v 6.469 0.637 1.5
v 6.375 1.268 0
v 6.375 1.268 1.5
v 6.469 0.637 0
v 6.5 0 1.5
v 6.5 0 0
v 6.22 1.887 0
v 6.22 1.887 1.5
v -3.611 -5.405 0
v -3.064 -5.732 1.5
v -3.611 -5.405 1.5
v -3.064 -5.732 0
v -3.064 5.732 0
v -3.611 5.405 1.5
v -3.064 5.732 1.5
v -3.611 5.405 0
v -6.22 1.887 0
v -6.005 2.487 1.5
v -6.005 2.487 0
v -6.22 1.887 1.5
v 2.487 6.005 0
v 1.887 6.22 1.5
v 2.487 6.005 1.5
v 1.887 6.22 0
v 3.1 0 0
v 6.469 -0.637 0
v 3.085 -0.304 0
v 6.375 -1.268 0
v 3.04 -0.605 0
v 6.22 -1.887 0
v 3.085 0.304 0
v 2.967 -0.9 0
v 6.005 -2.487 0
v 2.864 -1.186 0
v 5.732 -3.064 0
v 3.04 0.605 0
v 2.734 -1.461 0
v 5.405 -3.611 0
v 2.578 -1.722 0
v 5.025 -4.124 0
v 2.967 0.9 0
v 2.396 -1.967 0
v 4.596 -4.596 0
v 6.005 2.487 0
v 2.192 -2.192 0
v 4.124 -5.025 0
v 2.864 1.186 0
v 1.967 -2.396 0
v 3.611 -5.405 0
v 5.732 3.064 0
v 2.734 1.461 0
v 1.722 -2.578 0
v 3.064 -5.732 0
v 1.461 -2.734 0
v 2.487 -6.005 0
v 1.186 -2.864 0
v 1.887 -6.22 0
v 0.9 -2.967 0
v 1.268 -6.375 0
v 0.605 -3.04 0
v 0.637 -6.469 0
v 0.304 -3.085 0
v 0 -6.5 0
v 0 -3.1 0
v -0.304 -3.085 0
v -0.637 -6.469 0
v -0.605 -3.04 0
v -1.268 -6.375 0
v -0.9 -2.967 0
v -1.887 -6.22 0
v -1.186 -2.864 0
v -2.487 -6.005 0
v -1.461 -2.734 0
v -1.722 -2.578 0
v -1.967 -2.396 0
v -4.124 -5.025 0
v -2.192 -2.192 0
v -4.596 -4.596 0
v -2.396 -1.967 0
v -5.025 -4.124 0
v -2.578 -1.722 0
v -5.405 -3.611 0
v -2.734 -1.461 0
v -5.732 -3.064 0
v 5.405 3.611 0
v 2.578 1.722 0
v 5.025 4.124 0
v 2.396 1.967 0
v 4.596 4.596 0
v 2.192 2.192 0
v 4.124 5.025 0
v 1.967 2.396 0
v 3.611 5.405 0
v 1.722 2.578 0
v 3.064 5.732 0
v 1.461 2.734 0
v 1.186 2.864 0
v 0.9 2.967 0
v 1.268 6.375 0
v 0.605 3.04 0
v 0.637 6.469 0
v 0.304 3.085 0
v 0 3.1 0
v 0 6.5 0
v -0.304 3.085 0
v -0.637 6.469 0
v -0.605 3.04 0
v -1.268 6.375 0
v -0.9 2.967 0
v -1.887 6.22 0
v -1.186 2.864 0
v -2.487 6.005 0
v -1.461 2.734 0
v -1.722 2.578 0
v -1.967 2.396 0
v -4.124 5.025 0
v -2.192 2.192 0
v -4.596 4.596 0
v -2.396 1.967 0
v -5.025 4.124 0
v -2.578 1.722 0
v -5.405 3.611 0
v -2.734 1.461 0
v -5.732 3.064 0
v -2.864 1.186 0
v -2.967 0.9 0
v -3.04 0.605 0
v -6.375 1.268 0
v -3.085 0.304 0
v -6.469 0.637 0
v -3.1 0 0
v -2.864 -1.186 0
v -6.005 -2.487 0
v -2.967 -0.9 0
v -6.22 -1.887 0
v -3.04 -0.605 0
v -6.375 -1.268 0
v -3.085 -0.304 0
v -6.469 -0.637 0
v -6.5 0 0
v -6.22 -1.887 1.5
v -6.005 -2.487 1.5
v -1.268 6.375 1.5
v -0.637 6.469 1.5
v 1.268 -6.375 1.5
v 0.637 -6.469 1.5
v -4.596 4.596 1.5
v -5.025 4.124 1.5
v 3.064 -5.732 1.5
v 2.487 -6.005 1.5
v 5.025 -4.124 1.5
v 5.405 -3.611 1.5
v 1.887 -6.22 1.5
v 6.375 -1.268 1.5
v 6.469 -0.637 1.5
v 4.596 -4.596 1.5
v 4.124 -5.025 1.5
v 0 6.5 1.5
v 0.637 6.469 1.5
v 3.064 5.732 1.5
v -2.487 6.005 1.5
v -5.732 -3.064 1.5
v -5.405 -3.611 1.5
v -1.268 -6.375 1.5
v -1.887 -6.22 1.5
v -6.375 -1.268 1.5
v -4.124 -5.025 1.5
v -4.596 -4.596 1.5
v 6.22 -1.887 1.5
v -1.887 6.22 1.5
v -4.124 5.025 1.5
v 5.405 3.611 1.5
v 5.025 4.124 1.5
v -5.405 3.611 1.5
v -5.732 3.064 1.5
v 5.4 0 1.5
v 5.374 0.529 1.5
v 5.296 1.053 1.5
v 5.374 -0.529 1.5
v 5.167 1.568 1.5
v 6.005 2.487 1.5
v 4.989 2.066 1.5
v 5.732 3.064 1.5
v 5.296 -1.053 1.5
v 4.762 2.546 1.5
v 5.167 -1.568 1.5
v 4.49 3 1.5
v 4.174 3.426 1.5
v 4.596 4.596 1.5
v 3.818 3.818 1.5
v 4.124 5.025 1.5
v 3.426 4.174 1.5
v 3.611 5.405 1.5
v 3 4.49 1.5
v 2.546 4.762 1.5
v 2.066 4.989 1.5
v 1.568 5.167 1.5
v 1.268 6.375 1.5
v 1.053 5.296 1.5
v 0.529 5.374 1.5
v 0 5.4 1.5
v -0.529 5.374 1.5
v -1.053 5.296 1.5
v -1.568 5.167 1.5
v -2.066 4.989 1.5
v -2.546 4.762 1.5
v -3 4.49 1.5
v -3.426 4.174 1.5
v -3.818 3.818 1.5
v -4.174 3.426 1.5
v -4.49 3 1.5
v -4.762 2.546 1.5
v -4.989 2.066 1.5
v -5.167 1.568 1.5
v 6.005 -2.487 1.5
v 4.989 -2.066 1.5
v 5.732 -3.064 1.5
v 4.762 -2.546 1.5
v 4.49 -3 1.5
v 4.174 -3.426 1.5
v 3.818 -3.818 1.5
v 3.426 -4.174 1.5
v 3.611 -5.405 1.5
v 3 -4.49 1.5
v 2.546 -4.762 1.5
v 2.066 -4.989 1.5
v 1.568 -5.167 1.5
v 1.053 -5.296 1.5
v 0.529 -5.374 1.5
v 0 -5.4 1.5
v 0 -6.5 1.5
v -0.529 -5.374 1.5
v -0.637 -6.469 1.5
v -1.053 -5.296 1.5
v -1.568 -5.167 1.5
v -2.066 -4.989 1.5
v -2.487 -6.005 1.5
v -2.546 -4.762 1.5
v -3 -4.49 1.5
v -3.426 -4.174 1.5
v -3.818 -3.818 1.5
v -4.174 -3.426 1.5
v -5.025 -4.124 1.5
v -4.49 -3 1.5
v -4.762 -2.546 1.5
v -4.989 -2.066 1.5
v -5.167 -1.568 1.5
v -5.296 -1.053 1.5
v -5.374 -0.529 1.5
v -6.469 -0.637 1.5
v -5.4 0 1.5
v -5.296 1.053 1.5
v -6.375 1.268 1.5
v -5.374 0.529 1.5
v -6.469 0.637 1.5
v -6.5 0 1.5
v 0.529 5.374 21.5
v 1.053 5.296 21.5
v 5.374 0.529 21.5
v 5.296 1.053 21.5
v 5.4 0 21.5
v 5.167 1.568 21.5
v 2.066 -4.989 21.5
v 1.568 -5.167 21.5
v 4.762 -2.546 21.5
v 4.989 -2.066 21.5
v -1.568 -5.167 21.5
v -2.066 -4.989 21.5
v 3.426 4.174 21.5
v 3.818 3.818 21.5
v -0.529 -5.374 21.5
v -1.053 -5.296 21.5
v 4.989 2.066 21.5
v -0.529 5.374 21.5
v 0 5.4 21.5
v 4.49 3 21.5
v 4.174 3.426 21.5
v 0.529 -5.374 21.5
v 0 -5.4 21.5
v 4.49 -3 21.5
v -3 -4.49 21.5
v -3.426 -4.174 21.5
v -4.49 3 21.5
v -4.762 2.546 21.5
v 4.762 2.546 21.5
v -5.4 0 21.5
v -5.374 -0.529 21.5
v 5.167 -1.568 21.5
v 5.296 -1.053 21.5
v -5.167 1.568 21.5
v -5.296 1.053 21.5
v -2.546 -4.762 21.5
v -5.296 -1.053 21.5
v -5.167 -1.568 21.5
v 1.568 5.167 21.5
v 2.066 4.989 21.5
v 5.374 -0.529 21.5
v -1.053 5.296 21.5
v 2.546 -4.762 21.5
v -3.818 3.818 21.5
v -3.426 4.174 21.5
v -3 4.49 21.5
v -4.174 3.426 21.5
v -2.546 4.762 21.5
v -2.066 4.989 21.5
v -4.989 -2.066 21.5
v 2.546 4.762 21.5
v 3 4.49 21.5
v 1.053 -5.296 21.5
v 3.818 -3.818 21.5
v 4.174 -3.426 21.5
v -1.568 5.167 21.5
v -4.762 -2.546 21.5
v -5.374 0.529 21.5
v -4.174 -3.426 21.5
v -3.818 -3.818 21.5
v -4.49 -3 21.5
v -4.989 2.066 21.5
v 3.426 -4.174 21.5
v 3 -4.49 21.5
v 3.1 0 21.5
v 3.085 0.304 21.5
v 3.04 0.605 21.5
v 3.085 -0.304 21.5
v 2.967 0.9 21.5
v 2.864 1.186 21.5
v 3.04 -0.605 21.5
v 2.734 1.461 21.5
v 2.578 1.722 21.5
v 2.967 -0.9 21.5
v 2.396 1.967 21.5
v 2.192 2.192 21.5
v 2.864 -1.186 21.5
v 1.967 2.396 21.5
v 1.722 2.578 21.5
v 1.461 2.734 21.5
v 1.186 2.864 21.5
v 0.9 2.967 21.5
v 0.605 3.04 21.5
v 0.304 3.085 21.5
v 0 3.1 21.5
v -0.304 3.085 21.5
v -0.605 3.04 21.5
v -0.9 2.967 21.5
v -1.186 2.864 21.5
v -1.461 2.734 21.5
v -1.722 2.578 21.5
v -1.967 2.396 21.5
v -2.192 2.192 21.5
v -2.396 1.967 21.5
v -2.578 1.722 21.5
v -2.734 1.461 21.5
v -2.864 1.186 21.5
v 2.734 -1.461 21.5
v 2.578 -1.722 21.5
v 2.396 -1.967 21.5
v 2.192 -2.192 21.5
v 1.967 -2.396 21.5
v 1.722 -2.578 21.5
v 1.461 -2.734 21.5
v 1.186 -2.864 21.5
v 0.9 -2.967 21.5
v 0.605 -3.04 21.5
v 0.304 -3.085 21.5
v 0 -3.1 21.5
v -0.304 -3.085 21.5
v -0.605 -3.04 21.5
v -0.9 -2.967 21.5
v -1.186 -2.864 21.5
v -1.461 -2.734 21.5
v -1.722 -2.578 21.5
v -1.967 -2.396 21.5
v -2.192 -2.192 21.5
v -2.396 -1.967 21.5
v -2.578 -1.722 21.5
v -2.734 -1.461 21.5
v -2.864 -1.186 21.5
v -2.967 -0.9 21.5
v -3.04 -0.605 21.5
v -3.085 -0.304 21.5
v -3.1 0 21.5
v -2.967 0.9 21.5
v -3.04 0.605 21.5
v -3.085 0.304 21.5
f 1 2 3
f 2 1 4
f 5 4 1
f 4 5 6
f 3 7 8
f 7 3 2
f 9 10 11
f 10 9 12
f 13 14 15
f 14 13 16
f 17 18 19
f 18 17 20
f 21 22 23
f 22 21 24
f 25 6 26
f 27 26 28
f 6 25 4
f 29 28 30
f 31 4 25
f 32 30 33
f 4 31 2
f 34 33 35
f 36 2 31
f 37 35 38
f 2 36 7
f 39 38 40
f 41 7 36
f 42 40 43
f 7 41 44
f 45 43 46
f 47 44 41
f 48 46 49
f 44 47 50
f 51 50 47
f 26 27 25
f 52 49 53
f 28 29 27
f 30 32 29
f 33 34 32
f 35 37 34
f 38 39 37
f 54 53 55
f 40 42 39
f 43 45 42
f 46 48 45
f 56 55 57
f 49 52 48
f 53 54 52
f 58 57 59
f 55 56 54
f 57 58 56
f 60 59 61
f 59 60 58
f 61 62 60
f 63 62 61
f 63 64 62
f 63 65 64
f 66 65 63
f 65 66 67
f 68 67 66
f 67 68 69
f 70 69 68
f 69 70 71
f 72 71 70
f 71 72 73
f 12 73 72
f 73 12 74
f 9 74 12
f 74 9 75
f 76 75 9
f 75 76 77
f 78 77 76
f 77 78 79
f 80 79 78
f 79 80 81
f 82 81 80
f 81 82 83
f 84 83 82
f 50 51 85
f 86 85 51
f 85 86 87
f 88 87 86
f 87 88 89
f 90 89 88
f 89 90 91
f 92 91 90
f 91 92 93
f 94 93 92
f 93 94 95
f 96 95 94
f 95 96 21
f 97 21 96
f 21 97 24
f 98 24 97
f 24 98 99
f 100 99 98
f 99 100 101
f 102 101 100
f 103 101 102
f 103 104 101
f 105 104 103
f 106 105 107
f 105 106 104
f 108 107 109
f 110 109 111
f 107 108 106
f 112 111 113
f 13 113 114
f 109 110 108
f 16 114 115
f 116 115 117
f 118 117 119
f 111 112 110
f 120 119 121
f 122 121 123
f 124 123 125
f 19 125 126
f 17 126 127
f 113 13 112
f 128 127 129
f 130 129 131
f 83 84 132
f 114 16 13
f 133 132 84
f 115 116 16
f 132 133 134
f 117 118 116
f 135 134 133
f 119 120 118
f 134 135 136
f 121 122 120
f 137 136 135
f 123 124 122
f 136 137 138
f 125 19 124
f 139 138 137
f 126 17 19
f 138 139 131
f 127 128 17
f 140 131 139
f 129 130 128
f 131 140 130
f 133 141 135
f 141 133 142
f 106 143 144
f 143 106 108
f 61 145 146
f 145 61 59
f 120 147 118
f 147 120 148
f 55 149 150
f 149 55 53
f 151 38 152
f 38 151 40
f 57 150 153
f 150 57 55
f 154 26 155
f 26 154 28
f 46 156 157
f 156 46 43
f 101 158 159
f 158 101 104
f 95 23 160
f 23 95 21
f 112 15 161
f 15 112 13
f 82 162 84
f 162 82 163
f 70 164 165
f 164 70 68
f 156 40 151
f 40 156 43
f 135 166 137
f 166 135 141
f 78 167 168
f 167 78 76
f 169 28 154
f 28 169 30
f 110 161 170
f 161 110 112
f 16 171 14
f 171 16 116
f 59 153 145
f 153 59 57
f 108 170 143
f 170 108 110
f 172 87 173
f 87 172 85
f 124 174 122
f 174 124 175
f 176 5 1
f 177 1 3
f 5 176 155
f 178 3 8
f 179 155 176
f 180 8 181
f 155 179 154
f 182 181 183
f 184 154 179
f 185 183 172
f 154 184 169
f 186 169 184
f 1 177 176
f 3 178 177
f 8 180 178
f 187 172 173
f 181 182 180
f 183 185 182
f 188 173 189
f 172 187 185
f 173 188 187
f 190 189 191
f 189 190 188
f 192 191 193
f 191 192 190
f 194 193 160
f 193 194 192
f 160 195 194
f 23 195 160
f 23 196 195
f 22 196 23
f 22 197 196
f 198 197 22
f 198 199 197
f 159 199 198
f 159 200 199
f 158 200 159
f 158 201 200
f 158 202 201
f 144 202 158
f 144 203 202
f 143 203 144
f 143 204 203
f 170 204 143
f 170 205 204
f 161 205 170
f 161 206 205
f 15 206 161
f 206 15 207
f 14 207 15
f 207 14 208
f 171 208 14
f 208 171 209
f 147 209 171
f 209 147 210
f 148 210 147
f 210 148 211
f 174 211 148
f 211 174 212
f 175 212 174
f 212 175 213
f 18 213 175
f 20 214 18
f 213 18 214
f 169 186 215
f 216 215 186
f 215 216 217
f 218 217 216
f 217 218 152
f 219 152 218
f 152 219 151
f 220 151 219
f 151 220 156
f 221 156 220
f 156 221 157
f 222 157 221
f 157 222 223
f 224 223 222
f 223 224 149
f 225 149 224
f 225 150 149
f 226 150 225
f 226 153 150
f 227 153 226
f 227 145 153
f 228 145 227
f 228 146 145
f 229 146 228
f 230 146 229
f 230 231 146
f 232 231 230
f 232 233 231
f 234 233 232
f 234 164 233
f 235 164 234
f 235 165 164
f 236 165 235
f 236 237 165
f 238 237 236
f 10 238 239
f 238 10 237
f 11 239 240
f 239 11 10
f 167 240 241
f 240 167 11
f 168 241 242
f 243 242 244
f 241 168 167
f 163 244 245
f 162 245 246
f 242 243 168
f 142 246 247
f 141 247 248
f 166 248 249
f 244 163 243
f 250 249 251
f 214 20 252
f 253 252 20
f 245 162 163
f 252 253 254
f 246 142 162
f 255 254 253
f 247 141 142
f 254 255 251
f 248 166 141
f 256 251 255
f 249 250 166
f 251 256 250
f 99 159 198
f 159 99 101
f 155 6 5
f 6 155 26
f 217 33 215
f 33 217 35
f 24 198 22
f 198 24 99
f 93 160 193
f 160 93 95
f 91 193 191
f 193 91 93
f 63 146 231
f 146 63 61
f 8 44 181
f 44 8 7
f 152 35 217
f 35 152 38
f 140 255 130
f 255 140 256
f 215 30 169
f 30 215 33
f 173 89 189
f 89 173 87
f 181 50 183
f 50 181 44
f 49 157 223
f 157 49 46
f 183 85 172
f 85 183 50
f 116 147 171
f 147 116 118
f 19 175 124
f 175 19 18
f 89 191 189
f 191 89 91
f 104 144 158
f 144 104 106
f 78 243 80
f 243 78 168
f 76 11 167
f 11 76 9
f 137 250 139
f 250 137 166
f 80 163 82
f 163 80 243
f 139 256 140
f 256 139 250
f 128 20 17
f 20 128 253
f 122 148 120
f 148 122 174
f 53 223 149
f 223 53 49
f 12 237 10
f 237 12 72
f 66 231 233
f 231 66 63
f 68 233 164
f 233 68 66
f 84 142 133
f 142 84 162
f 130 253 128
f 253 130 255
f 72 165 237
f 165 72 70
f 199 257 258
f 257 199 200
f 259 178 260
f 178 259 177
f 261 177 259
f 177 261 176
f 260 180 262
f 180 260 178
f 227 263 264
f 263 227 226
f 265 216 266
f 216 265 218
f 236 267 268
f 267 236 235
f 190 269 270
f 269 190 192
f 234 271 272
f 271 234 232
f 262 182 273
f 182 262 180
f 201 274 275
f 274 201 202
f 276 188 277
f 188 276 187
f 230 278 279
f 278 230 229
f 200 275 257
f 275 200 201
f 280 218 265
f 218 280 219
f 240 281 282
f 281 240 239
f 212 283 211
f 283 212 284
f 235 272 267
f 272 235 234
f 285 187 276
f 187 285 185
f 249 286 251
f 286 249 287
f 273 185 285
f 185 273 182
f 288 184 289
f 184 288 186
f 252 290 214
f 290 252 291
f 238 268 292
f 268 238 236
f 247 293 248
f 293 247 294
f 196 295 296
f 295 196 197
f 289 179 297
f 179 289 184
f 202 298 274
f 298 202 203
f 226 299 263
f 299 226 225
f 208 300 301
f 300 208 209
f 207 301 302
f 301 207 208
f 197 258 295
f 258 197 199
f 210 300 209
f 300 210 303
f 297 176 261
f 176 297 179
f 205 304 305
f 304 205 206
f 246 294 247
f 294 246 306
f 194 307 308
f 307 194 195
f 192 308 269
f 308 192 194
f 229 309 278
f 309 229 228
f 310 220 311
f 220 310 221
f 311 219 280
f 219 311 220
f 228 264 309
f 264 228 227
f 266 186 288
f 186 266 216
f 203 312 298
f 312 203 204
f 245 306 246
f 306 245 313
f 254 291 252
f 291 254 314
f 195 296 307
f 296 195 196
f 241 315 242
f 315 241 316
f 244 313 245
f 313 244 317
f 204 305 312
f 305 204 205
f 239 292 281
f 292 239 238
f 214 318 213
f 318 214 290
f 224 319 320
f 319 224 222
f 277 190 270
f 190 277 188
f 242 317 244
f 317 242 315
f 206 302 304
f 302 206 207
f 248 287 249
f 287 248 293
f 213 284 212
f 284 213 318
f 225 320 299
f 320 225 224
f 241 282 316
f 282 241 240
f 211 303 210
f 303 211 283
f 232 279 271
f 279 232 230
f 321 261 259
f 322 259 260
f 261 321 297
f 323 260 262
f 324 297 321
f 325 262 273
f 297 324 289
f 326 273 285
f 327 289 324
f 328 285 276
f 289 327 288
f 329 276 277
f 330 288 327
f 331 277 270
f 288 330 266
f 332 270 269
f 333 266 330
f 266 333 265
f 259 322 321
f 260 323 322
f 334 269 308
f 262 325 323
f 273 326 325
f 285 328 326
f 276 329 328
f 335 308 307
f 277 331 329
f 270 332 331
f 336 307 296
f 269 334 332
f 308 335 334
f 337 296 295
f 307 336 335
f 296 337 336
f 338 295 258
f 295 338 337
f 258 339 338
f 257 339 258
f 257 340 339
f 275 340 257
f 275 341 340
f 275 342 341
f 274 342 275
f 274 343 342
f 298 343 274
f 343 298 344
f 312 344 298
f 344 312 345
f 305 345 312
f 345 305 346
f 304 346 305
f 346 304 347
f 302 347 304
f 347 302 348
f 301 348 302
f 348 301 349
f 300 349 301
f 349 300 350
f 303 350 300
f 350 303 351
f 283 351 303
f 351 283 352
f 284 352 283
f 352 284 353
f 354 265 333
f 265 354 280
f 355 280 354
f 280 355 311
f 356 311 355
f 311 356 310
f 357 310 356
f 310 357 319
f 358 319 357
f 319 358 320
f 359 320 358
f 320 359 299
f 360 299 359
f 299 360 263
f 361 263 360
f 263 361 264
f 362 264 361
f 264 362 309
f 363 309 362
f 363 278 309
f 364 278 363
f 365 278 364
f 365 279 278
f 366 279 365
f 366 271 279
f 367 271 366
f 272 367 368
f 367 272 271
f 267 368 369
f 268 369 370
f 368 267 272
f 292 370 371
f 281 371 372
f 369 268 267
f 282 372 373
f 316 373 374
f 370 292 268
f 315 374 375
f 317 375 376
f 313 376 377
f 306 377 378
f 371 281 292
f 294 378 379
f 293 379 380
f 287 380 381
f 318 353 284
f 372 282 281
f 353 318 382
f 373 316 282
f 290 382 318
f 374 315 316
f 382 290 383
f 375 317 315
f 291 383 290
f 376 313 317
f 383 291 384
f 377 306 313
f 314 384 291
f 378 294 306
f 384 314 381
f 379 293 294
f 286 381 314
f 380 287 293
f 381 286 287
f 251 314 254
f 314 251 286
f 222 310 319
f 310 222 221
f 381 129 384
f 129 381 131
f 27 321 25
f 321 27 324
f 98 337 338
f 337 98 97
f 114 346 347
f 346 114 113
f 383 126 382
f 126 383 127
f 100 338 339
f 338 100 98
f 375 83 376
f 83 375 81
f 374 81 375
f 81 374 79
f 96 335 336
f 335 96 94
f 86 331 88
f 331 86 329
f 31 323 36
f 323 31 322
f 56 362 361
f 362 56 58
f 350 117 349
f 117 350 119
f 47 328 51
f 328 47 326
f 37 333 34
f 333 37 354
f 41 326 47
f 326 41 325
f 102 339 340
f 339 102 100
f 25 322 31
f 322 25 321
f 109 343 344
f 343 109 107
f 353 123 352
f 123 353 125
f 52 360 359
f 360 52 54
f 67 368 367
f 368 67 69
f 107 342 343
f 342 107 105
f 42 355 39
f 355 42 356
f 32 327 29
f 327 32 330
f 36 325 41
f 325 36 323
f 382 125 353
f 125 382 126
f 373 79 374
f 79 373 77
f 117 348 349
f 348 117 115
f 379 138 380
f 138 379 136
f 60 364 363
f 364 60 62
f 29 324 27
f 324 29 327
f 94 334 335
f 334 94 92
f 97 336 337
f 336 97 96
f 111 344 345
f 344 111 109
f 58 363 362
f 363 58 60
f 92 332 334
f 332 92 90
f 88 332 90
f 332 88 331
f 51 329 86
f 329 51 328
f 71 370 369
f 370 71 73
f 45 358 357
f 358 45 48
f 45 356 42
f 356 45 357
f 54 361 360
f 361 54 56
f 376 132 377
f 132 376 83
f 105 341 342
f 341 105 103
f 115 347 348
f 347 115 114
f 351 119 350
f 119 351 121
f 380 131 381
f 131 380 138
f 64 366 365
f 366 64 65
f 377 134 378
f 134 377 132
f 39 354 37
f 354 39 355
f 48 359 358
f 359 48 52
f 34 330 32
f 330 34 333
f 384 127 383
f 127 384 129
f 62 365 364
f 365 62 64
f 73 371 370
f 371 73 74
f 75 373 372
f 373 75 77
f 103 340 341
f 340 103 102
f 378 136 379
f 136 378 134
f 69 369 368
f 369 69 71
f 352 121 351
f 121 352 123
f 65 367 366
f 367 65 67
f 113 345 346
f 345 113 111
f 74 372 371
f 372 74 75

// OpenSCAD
// Adapter sleeve: 0.2 mL PCR tube for 1.5 mL tube rack hole
// Print orientation: collar on bed (z = 0), sleeve body rises to z = 21.5

$fn = 64;

// --- Dimensions (mm) ---
collar_d        = 13;    // collar outer diameter
collar_h        = 1.5;   // collar thickness (z = 0 to 1.5)
sleeve_od       = 10.8;  // sleeve body outer diameter
sleeve_top_z    = 21.5;  // top of sleeve body
bore_d          = 6.2;   // through-bore diameter
eps             = 0.5;   // cutter overshoot past faces

// Derived
sleeve_h = sleeve_top_z - collar_h;  // sleeve body height (20)

difference() {
    union() {
        // Collar
        cylinder(d = collar_d, h = collar_h);
        // Sleeve body (slightly overlapping collar for a clean union)
        translate([0, 0, collar_h - 0.01])
            cylinder(d = sleeve_od, h = sleeve_h + 0.01);
    }
    // Through bore
    translate([0, 0, -eps])
        cylinder(d = bore_d, h = sleeve_top_z + 2 * eps);
}
